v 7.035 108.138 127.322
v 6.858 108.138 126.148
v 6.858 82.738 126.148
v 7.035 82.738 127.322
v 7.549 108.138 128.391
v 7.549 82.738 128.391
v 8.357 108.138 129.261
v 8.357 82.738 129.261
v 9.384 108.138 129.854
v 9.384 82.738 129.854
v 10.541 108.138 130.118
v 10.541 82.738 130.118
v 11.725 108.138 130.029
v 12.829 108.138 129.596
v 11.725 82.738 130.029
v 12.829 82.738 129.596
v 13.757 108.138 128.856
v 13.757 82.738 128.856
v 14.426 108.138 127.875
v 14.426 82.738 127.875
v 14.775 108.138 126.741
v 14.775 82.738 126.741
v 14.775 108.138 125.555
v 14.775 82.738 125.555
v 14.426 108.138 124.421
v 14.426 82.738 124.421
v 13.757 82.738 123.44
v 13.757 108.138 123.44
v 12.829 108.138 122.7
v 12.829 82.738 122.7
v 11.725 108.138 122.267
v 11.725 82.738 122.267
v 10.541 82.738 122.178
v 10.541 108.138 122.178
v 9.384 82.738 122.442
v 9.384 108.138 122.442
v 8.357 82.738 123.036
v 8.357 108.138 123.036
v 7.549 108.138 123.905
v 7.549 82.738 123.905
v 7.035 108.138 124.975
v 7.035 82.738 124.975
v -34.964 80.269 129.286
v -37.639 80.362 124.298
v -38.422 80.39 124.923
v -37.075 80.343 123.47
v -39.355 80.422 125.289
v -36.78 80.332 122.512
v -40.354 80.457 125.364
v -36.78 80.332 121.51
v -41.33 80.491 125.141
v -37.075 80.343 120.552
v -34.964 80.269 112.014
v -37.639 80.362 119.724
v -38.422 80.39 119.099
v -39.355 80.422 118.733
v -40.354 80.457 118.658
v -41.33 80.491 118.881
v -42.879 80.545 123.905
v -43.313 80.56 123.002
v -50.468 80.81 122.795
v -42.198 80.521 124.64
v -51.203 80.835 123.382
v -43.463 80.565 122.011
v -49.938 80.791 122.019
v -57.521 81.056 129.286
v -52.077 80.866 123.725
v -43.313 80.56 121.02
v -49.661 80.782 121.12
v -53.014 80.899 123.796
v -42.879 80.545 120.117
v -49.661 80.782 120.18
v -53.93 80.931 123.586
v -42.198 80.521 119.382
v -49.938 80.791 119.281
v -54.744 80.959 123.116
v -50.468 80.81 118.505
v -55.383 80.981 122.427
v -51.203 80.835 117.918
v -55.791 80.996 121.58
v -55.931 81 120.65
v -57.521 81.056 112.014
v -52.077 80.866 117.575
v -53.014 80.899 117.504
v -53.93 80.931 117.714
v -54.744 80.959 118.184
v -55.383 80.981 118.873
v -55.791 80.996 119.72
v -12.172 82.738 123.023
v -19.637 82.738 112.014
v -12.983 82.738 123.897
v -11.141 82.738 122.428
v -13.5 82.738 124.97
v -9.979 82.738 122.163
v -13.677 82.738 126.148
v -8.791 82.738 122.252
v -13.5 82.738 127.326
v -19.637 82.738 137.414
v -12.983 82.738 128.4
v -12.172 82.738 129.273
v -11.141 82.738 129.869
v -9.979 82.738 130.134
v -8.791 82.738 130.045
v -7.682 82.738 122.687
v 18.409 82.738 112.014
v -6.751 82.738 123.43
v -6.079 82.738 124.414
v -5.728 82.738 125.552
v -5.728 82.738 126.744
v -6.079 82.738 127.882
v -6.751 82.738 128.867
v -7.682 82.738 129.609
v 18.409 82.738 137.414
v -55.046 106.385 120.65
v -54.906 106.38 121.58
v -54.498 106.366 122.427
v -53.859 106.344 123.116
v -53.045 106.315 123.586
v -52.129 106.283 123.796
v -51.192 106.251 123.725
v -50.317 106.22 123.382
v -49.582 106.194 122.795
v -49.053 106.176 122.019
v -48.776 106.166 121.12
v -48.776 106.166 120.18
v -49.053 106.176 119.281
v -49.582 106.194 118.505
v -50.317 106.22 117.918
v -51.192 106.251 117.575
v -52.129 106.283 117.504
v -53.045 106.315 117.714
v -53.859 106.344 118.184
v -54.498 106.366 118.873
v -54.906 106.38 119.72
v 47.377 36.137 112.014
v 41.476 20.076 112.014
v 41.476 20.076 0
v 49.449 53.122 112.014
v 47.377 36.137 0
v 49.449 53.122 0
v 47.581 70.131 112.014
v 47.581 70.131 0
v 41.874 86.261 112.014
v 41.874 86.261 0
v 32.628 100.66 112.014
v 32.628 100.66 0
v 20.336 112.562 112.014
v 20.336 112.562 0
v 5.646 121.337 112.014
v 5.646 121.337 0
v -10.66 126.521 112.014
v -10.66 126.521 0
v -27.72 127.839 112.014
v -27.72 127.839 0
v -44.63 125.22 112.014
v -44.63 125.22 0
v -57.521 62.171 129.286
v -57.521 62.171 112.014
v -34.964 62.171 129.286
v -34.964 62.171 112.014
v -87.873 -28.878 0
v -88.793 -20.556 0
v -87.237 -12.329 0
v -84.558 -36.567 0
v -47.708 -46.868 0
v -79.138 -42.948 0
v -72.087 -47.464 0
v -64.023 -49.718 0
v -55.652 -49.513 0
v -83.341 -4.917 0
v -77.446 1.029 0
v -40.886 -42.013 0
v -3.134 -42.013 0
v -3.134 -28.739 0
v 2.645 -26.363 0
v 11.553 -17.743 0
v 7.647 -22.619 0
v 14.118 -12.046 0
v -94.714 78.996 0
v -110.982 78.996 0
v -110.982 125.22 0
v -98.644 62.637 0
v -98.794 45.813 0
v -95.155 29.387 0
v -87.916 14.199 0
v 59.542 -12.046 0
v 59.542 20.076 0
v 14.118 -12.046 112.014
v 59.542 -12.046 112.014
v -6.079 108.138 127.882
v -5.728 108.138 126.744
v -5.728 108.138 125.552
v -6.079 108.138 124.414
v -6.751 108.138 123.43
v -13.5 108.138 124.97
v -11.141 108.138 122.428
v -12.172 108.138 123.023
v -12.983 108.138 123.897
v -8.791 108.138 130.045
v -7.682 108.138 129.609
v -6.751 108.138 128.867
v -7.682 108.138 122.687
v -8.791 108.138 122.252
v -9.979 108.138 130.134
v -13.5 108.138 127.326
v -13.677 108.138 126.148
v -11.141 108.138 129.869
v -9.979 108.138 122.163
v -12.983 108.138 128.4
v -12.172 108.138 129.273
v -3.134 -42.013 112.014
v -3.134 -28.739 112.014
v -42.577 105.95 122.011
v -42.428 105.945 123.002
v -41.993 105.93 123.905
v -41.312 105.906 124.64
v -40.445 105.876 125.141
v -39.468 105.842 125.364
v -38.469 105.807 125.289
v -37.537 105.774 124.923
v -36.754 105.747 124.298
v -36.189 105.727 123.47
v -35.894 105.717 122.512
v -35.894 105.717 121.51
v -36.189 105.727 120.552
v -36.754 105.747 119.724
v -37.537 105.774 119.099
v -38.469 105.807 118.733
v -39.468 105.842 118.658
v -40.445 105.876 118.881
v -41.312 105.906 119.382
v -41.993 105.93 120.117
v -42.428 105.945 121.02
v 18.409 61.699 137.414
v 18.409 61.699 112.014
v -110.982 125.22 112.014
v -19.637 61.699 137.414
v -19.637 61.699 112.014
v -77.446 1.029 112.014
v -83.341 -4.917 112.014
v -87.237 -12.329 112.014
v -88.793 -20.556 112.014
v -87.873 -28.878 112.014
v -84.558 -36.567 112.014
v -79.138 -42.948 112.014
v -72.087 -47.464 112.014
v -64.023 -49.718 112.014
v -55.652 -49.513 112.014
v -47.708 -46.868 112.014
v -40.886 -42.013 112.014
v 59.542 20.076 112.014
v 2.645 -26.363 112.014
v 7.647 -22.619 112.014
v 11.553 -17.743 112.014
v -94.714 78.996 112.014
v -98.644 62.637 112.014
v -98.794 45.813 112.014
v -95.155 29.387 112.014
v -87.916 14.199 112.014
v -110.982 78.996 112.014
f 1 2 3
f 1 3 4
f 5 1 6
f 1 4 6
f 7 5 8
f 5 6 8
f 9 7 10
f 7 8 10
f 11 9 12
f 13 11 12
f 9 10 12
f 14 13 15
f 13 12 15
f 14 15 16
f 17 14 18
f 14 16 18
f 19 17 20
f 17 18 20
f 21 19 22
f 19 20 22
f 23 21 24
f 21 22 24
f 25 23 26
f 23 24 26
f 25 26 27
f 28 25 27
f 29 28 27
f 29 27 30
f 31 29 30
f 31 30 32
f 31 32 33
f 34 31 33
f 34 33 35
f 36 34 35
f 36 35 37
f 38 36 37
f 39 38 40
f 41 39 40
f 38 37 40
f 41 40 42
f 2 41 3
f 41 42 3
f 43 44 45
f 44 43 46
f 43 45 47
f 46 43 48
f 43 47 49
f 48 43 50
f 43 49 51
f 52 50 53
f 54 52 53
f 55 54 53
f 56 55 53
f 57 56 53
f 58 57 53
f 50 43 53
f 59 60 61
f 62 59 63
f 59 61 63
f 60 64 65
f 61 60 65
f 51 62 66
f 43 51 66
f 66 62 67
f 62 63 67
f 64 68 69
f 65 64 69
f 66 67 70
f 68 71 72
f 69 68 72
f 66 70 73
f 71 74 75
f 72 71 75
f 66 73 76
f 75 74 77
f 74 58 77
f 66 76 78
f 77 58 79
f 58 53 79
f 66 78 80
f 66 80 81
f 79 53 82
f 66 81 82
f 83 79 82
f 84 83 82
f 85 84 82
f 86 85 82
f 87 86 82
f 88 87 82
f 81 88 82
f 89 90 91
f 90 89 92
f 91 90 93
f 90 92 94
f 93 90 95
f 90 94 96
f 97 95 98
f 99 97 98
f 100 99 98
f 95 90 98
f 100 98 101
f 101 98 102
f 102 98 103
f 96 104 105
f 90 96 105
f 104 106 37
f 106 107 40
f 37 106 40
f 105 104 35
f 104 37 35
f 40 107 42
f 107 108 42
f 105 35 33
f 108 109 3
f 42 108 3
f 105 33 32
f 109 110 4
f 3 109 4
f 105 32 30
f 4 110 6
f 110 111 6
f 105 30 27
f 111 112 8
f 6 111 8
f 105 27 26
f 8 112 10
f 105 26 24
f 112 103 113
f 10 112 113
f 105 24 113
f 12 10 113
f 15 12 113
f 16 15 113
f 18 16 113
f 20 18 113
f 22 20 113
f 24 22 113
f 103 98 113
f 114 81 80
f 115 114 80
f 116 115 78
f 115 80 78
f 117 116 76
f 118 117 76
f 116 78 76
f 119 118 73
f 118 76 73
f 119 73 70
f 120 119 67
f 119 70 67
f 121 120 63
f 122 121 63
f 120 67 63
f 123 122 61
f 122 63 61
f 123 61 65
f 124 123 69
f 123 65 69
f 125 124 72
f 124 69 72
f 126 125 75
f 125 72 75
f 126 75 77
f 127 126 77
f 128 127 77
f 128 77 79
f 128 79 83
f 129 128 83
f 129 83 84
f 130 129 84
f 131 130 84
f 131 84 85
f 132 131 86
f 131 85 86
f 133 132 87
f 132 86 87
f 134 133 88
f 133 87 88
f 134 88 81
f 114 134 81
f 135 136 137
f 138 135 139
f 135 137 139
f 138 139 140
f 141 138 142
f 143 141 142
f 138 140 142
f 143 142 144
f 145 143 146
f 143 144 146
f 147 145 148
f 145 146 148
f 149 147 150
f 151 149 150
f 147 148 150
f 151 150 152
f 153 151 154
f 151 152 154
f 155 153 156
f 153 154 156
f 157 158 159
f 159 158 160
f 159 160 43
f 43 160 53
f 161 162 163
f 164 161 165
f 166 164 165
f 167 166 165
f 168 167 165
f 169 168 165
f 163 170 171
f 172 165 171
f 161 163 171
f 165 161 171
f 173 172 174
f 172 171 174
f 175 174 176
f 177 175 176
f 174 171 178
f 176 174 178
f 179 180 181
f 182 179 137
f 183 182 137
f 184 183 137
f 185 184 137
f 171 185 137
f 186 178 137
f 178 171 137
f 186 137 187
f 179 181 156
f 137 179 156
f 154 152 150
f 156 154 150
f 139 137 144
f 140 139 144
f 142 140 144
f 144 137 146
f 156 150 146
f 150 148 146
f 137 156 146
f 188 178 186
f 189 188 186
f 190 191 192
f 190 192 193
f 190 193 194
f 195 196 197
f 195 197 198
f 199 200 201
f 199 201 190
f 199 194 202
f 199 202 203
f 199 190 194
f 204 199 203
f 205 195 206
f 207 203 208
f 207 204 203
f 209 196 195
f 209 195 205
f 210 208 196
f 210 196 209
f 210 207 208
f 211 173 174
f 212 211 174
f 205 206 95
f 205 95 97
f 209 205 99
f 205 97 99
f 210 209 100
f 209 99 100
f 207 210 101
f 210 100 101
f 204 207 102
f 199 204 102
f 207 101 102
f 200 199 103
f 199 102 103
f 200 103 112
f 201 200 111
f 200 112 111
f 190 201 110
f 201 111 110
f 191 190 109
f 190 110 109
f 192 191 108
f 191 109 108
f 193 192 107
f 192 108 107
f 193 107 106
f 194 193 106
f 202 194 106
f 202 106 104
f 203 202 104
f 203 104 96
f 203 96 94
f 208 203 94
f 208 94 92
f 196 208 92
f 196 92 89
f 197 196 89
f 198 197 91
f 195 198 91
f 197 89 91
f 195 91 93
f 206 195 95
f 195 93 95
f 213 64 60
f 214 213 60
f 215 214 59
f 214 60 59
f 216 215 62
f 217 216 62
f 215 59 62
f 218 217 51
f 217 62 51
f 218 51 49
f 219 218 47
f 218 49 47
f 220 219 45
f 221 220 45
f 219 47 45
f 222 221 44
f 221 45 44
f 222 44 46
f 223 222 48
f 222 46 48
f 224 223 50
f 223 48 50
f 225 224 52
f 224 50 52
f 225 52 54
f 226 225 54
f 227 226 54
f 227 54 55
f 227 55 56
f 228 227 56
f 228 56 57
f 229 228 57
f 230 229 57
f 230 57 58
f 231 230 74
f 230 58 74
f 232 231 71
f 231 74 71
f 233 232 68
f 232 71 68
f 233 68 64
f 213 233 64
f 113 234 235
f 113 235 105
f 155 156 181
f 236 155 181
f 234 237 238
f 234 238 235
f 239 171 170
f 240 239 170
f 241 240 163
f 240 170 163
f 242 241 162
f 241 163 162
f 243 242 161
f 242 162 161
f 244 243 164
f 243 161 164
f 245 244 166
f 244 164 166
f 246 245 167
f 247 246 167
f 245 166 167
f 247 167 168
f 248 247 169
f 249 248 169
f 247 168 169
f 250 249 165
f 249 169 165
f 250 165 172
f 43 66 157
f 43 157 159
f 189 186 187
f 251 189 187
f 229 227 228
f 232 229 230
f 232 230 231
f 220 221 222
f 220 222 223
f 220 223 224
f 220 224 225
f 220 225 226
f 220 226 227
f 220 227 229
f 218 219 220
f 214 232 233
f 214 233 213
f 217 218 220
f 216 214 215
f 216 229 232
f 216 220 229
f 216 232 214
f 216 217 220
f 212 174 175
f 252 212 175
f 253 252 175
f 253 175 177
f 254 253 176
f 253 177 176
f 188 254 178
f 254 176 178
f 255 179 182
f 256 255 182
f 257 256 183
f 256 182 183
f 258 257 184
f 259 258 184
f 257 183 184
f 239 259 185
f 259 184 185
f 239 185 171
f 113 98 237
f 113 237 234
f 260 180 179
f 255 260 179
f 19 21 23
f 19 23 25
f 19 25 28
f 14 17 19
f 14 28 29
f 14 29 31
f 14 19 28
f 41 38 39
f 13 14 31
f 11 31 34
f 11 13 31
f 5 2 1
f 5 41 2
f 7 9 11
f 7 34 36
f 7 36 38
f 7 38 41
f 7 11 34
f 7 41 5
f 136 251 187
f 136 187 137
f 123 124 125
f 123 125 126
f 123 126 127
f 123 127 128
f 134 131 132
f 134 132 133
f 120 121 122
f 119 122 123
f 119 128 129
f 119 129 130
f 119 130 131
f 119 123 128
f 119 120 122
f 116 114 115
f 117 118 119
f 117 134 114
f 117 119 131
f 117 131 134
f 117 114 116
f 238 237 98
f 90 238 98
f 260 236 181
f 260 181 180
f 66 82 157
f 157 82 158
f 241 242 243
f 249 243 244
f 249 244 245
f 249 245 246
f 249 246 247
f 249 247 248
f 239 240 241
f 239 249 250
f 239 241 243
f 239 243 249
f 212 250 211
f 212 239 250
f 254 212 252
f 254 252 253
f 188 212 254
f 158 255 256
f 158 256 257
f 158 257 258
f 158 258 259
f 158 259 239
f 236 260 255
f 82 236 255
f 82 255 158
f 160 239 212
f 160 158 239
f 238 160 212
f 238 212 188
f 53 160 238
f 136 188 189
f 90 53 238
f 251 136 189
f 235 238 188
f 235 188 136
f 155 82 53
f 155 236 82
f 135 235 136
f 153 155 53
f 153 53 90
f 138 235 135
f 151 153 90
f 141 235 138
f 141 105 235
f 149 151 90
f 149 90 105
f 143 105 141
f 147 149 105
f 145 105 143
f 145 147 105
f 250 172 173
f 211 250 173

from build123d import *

# Parameters (mm, degrees)
F1_DEPTH  = 112.014
F3_DEPTH  = 17.272
F4_R      = 3.3623176789
F5_DEPTH  = 25.4
F6_R      = 3.1543384868
F7_DEPTH  = 25.4
F8_W      = 38.0456186831
F8_H      = 21.038826555
F9_DEPTH  = 25.4
F10_DEPTH = 8.382
F11_DEPTH = 10.414
F12_DEPTH = 9.652
F13_DEPTH = 11.684
F14_R     = 3.9810308691
F14_R_2   = 3.9967217836
F15_DEPTH = 25.4


with BuildPart() as f1:
    # F0 (on Top) → F1 (new body)
    with BuildSketch(Plane.XY):
        with BuildLine():
            ThreePointArc((-94.7144221793, 78.996181488), (-97.4408484509, 37.4965810895), (-77.4463454997, 1.029197235))
            ThreePointArc((-77.4463454997, 1.029197235), (-82.0851675961, -39.9590099953), (-40.8864470189, -42.0125983655))
            Line((-40.8864470189, -42.0125983655), (-3.1338073313, -42.0125983655))
            Line((-3.1338073313, -42.0125983655), (-3.1338073313, -28.7388270008))
            ThreePointArc((-3.1338073313, -28.7388270008), (7.6465004578, -22.6188809922), (14.1175022251, -12.0455697179))
            Line((14.1175022251, -12.0455697179), (59.5423281193, -12.0455697179))
            Line((59.5423281193, -12.0455697179), (59.5423281193, 20.0759489089))
            Line((59.5423281193, 20.0759489089), (41.4761226971, 20.0759489089))
            ThreePointArc((41.4761226971, 20.0759489089), (32.6284517751, 100.6595778454), (-44.6295377394, 125.2198219299))
            Line((-44.6295377394, 125.2198219299), (-110.9817028046, 125.2198219299))
            Line((-110.9817028046, 125.2198219299), (-110.9817028046, 78.996181488))
            Line((-110.9817028046, 78.996181488), (-94.7144221793, 78.996181488))
        make_face()
    extrude(amount=F1_DEPTH)

    # F2 (on face) → F3 (join)
    with BuildSketch(Plane.XY.offset(112.014)):
        Polygon((-34.9643416703, 80.2690163255), (-57.5213618577, 81.0558870435), (-57.5213618577, 62.1709451079), (-34.9643416703, 62.1709451079), align=None)
    extrude(amount=F3_DEPTH)

    # F4 (on face) → F5 (join)
    with BuildSketch(Plane(origin=(2.7541761254, 78.9532575536, 0), x_dir=(-0.9993921209, 0.0348624237, 0), z_dir=(0.0348624237, 0.9993921209, 0))):
        with Locations((42.88270697, 122.0109984279)):
            Circle(F4_R)
    extrude(amount=F5_DEPTH)

    # F6 (on face) → F7 (join)
    with BuildSketch(Plane(origin=(2.7541761254, 78.9532575536, 0), x_dir=(-0.9993921209, 0.0348624237, 0), z_dir=(0.0348624237, 0.9993921209, 0))):
        with Locations((55.5666647851, 120.65)):
            Circle(F6_R)
    extrude(amount=F7_DEPTH)

    # F8 (on face) → F9 (join)
    with BuildSketch(Plane.XY.offset(112.014)):
        with Locations((-0.6137024611, 72.2188074142)):
            Rectangle(F8_W, F8_H)
    extrude(amount=F9_DEPTH)

    # F10 (add): a face of the model
    f10_faces = [f1.faces().sort_by_distance(p)[0] for p in [
        (-0.6137024611, 72.2188074142, 137.414),
    ]]
    extrude(f10_faces, amount=-F10_DEPTH)

    # F11 (add): a face of the model
    f11_faces = [f1.faces().sort_by_distance(p)[0] for p in [
        (-0.6137024611, 72.2188074142, 137.414),
    ]]
    extrude(f11_faces, amount=-F11_DEPTH)

    # F12 (add): a face of the model
    f12_faces = [f1.faces().sort_by_distance(p)[0] for p in [
        (-0.6137024611, 72.2188074142, 137.414),
    ]]
    extrude(f12_faces, amount=-F12_DEPTH)

    # F13 (add): a face of the model
    f13_faces = [f1.faces().sort_by_distance(p)[0] for p in [
        (-0.6137024611, 72.2188074142, 137.414),
    ]]
    extrude(f13_faces, amount=-F13_DEPTH)

    # F14 (on face) → F15 (join)
    with BuildSketch(Plane(origin=(0, 82.7382206917, 0), x_dir=(-1, 0, 0), z_dir=(0, 1, 0))):
        with Locations((-10.8387600631, 126.1480897665)):
            Circle(F14_R)
        with Locations((9.6803465858, 126.1480897665)):
            Circle(F14_R_2)
    extrude(amount=F15_DEPTH)


solid = f1.part
